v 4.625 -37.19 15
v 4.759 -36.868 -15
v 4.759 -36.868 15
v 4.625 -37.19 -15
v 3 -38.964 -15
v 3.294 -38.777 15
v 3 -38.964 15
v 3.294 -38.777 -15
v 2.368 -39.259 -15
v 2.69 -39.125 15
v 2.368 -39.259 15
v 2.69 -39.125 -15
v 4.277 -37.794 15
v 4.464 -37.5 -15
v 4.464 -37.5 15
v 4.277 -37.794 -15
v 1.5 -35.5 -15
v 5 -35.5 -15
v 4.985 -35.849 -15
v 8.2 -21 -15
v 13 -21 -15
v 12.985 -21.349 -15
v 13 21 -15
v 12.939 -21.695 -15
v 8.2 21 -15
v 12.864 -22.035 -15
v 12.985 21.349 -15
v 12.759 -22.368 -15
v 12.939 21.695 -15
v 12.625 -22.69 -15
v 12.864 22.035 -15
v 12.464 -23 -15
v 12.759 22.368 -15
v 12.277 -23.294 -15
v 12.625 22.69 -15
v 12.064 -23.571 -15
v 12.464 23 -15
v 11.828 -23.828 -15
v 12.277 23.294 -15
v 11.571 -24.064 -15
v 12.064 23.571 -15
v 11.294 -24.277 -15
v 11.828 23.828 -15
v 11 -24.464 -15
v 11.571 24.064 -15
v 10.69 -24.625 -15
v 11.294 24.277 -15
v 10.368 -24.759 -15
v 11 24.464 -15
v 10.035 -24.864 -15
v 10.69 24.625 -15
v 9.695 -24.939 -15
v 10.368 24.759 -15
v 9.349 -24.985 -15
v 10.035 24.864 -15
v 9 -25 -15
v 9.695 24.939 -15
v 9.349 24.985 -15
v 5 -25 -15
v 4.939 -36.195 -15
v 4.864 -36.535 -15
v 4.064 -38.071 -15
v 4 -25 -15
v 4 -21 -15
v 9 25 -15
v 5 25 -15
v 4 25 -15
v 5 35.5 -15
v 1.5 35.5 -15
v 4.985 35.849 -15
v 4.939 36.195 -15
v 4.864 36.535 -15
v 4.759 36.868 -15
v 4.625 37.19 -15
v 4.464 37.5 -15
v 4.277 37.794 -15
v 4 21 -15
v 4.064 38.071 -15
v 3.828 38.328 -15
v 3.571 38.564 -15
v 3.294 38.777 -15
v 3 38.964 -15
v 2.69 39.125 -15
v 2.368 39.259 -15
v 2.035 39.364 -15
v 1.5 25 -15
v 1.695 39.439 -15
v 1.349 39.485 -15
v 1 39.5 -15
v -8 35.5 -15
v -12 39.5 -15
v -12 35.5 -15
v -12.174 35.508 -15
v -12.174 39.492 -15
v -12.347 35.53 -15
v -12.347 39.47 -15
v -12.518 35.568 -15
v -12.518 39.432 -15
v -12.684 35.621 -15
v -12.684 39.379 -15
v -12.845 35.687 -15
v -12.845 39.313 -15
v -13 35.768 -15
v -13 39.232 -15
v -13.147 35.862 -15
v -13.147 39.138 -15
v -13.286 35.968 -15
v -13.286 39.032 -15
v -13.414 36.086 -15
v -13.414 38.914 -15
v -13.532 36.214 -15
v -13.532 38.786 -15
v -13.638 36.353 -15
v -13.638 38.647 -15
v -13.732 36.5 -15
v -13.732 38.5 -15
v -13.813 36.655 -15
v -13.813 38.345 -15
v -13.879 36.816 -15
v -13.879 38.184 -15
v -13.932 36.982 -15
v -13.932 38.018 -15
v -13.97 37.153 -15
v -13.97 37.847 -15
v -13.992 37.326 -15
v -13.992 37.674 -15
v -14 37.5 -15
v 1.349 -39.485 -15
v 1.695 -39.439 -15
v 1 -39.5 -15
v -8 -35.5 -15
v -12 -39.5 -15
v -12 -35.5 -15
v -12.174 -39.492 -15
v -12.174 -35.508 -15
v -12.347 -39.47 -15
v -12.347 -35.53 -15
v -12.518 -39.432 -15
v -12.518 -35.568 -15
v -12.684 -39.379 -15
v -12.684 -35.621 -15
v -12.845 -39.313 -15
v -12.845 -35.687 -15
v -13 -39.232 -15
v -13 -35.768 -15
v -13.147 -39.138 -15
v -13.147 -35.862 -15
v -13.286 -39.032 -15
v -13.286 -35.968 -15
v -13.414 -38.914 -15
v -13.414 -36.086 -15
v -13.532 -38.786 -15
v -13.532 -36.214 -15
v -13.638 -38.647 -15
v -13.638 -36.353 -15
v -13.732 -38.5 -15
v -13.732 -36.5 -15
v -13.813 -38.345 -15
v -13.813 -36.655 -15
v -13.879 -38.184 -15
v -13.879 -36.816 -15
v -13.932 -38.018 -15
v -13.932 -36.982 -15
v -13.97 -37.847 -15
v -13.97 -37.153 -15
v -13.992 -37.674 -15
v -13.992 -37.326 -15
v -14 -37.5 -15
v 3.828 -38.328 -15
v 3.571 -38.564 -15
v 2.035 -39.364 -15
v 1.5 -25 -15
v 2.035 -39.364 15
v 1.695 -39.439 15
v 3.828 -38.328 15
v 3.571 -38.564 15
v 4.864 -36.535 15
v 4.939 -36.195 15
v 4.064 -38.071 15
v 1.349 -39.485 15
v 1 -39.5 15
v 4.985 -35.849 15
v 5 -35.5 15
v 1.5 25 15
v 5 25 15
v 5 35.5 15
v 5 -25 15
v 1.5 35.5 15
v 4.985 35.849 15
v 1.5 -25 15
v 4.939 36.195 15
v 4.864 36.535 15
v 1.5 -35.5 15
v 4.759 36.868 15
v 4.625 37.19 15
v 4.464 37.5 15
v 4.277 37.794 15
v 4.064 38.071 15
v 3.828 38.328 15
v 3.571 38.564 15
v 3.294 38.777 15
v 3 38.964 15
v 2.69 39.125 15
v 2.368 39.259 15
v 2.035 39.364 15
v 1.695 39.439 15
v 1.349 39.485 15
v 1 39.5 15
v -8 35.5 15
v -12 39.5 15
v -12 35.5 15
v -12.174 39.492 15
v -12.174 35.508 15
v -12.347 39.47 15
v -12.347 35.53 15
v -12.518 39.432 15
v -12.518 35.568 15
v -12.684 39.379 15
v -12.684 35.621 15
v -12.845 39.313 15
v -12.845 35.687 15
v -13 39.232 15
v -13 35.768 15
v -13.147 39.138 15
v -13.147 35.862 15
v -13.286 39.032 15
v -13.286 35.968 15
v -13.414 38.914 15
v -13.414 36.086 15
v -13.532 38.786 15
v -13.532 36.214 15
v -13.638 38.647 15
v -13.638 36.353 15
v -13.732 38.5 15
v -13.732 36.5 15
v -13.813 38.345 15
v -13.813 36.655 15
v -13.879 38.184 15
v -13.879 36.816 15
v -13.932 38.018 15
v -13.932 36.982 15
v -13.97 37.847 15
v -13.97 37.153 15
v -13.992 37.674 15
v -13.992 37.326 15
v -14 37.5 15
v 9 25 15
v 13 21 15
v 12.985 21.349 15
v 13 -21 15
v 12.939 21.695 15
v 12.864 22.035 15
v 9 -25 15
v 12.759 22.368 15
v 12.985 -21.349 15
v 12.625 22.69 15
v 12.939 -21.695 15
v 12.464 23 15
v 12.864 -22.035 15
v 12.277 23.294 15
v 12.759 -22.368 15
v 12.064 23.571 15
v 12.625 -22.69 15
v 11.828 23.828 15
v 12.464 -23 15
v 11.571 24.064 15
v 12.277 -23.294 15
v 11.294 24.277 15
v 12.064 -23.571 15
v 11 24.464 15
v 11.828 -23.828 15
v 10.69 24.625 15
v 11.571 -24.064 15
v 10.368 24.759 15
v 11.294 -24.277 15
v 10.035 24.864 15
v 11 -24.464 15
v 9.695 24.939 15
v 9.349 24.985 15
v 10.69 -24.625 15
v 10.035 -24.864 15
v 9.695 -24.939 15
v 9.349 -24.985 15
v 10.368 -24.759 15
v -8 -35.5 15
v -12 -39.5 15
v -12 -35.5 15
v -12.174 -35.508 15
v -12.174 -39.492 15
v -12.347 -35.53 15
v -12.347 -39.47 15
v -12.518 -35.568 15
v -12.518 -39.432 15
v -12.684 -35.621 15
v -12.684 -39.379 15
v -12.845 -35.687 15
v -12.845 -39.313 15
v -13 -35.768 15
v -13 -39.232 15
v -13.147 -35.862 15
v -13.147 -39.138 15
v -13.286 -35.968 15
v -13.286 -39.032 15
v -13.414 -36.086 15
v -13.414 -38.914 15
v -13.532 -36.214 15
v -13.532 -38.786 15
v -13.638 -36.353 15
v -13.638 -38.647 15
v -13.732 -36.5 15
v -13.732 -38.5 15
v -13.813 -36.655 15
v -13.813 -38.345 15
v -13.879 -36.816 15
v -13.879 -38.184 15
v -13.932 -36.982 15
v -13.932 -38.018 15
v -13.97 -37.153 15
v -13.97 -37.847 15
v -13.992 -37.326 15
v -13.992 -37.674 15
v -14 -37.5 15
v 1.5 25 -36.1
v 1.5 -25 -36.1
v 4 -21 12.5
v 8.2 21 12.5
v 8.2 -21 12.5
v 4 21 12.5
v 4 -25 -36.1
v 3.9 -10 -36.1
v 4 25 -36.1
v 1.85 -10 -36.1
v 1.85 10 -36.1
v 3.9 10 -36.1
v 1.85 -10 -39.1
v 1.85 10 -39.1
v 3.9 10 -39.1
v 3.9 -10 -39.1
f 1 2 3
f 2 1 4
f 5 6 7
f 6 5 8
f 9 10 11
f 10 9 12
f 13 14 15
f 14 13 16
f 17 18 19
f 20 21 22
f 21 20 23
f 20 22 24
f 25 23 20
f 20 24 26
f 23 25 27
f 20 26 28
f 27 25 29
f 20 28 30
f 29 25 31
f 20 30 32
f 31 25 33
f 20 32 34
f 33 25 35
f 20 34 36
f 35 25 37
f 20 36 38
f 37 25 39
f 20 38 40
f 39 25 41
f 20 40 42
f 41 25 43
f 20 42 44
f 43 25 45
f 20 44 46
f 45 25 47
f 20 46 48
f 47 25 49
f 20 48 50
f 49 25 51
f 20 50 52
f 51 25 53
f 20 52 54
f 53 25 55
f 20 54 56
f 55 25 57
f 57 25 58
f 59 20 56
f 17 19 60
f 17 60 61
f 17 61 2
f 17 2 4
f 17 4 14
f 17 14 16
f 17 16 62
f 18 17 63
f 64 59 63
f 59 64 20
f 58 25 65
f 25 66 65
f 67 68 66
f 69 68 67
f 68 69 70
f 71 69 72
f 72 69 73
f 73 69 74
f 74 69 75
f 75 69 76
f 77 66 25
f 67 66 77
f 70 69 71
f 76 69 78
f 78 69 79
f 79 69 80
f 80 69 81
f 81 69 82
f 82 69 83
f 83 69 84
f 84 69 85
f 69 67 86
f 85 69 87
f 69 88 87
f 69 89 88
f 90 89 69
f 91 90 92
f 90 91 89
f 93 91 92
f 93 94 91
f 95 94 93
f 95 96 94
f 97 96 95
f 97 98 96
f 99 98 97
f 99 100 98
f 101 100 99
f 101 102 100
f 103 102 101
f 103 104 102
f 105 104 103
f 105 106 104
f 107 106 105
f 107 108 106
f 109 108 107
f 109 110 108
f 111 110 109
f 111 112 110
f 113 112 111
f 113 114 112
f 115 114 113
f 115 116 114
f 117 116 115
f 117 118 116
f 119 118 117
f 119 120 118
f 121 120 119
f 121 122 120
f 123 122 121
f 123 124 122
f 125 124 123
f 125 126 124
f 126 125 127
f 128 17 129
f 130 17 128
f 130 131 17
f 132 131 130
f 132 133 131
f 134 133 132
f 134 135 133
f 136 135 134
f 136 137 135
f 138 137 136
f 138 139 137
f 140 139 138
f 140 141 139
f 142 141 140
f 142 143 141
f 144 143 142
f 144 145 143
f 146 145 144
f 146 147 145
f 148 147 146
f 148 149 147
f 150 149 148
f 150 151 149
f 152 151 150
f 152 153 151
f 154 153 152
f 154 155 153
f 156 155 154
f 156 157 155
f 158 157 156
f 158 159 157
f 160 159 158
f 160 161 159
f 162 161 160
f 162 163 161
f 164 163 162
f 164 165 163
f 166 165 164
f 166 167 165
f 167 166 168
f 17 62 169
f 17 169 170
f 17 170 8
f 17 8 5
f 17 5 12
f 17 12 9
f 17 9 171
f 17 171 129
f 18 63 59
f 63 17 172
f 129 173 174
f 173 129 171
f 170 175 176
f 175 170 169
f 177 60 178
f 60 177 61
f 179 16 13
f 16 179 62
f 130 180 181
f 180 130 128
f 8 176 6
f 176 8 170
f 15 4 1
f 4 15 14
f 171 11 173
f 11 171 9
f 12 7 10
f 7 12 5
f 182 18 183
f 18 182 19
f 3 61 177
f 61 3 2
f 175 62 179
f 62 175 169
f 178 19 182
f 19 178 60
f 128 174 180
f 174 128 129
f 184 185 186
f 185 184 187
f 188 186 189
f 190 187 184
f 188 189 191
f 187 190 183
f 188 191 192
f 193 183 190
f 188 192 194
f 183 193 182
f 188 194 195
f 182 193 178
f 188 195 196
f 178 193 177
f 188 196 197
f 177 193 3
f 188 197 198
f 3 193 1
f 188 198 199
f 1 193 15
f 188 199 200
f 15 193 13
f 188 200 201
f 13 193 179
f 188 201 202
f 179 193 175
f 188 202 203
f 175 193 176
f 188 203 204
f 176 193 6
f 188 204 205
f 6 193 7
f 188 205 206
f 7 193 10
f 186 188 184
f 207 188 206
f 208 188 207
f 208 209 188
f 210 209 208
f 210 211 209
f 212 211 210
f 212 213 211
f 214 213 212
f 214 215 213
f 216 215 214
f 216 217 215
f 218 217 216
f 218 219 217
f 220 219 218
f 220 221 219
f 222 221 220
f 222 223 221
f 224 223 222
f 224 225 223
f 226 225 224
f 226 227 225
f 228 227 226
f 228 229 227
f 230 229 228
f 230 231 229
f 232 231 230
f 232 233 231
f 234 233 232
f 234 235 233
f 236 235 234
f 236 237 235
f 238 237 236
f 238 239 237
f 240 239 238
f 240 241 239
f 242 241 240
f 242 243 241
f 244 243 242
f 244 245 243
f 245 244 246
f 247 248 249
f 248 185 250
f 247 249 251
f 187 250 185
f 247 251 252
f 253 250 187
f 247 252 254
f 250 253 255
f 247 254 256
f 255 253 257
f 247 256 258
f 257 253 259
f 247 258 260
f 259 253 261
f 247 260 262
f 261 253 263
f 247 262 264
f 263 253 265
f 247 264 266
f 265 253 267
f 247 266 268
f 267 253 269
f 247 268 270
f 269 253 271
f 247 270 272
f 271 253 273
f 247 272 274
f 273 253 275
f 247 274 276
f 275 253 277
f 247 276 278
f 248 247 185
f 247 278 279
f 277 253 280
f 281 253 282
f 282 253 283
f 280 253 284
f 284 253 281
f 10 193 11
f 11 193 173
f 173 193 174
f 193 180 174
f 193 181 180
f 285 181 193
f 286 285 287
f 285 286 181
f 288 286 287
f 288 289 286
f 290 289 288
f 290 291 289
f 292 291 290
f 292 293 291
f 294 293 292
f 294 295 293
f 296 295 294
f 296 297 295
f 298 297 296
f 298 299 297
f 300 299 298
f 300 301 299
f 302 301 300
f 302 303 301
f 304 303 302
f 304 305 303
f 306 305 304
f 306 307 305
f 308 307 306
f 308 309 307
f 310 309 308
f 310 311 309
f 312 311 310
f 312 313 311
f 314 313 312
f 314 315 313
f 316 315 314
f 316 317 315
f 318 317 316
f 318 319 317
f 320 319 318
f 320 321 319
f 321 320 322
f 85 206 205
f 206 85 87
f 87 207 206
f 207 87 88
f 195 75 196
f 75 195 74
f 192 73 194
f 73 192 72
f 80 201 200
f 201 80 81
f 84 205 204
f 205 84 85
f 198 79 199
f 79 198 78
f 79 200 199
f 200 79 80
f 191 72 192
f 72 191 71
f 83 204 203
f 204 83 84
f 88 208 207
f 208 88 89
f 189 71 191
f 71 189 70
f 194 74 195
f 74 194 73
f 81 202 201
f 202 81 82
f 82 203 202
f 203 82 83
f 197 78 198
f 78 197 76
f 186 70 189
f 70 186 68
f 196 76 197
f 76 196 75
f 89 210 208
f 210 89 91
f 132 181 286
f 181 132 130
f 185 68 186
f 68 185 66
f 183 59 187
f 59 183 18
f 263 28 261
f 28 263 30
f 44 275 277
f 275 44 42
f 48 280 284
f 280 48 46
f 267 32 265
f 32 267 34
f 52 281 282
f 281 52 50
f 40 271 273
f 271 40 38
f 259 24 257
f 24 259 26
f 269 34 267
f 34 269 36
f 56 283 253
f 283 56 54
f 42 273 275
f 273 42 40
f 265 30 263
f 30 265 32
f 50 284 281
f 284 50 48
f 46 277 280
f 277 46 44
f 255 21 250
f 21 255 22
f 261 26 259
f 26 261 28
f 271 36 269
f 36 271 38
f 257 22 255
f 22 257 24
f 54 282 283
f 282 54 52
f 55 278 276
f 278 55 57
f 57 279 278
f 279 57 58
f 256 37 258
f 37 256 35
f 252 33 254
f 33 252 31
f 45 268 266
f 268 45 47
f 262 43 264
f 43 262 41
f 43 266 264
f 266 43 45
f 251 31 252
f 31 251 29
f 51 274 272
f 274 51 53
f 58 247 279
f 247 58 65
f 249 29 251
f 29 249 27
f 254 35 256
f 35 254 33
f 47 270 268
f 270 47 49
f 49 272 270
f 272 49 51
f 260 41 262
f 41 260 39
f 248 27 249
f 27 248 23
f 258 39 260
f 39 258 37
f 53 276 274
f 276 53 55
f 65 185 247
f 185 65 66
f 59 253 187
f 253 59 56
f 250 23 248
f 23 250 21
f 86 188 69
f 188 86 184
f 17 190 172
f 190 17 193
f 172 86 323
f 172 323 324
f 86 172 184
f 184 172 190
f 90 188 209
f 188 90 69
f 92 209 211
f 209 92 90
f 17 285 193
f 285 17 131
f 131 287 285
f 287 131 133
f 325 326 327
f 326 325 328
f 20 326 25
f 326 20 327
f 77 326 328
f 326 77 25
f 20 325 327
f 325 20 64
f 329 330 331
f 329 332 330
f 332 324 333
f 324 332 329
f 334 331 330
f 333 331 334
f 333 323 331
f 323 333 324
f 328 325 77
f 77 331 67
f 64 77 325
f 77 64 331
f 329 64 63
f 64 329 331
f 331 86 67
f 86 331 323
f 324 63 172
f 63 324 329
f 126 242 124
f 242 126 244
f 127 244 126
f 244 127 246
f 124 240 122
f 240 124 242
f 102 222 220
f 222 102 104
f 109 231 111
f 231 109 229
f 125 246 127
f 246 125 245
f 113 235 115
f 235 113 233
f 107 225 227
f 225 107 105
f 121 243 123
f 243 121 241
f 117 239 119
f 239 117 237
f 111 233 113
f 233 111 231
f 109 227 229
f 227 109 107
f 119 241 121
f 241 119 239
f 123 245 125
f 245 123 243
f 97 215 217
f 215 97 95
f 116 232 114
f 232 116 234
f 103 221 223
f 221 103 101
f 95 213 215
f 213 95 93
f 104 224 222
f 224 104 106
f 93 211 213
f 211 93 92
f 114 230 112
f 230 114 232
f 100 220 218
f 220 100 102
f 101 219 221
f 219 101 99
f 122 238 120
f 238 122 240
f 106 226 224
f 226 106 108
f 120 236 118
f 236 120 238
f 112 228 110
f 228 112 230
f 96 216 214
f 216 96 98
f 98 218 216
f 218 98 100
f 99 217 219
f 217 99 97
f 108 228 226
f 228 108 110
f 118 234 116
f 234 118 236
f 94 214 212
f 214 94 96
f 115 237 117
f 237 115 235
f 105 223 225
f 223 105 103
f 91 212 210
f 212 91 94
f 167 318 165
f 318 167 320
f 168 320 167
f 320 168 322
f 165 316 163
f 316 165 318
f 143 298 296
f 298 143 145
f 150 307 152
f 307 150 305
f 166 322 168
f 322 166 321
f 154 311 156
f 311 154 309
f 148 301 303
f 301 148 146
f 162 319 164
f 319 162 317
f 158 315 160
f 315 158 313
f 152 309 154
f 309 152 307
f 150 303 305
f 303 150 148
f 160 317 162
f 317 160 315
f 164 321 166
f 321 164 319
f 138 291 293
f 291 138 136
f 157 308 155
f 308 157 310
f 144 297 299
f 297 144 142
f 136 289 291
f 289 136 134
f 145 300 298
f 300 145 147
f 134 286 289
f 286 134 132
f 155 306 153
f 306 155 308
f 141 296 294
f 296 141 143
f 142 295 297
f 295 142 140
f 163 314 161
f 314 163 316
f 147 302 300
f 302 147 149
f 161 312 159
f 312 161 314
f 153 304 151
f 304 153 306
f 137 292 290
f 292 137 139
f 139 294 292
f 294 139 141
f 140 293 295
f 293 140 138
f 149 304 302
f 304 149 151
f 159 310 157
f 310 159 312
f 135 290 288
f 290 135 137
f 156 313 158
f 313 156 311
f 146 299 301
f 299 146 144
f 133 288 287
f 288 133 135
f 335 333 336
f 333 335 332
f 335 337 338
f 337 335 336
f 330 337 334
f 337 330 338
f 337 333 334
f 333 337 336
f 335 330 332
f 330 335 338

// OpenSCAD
// preview[view:south west, tilt:top diagonal]
include <MCAD/boxes.scad>  // Include Boxes library to get easy rounded boxes

/* [Top holder spec] */
// Which one would you like to see?
part = "first"; // [first:Top holder,second:Connector]

// Text line 1, example: Phone model name
phone_name = "";

// Font size for text line 2, "TextLabel"
font_size = 11; // [3:29]

// Text line 2, example: Your own name 
TextLabel = "";
font = "REGISTRATION PLATE UK:style=Bold";

// The width of your phone including any cover you have on it
phone_width = 71; // [50:150]

// The length from the back of the connector to the back of the phone
phone_depth = 8; // [0:0.1:7]

/* [Connector adapter spec] */
// The width of the connector
connector_width = 11.1; // [0:0.1:32]

// The depth of the connector
connector_depth = 6.2; // [0:0.1:14]

// The height of the connector
connector_height = 17; // [0:0.1:29]

print_part();

module print_part() {
	if (part == "first") {
		topholder();
	} else if (part == "second") {
		connector();
	} else {
		topholder();
	}
}

module topholder() {
    
rotate([180,0,180]) {
// Difference will construct a main shape and subtract cut outs
difference() {
    
  // Main Shape
  union(){
    translate([5,0,0]) {
    roundedBox([20, phone_width+8, 30], 4, true, $fn=72);
    }
    roundedBox([26, 50, 30], 4, true, $fn=72);
  } // End union
  
  // Cut outs
  translate([12,0,0]) {
    cube([27,phone_width,32],true);
    cube([26,49,32],true);   
    }
    translate([-6.1,0,5]) {
      cube([4.2,42,35],true);
    }
    
    translate([14,0,0]) {    
      cube([4, 300, 32], true);
    }
 
   
  } // End difference
    
// Add ons
  
difference() {
  union(){
    translate([-4,-25,-15]) {
      cube([2.5,50,51.1],false);
      cube([10.5-phone_depth,50,45],false);
    }

    translate([-3.9,-10,-15]) {
      cube([2.05,20,54.1],false);
    }
    
    translate([10,phone_width/2+2,0]) {    
      roundedBox([8, 4, 30], 2, true, $fn=72);
    }
    
    translate([10,-phone_width/2-2,0]) {    
      roundedBox([8, 4, 30], 2, true, $fn=72);
    }
    
  }
  
   translate([6-phone_depth,0,11]) {
    rotate([90,180,90]) {
      linear_extrude(height = 1.5) {
        text(text = str(TextLabel), font = font, size = font_size, valign = "center", halign = "center");
      }
    }
    }
    
     translate([6-phone_depth,0,-10]) {
    rotate([90,180,90]) {
      linear_extrude(height = 1.5) {
        text(text = str(phone_name), font = font, size = 4, valign = "center", halign = "center");
      }
    }
    }
  
  
}
}
}



module connector() {
    
rotate([0,10,180]) {
  translate([-40,0,-0.5]) {
// Difference will construct a main shape and subtract cut outs
difference() {
    
  // Main Shape
  union(){
    translate([0,0,0]) {
    roundedBox([16, 37.8, 31], 2, true, $fn=72);
    }
    translate([0,-18.9,-15.5]) {
      cube([8, 37.8, 31], false);
    }
  } // End union
  
  // Cut outs
  translate([-2.15,17,-5.8]) {
    cube([4.3,2.10,21.34],false);   
  }
  
  translate([-2.15,-17-2.10,-5.8]) {
    cube([4.3,2.10,21.34],false);
  }
  
  cylinder( 35,3,3, true, $fn=30);
  
  translate([0,-2.75,-18]) {
    cube([10,5.5,35],false);
  }
  
  rotate([0,-10,0]) {
    translate([-15,-20,-18.6]) {
      cube([25,40,5],false);
    }
  }
  
  // Customized hole
  translate([-connector_depth/2,-connector_width/2,15.6-(connector_height-1)]) {
    cube([connector_depth,connector_width,connector_height-1],false);
  }
  
  } // End difference
    
}
}
}
